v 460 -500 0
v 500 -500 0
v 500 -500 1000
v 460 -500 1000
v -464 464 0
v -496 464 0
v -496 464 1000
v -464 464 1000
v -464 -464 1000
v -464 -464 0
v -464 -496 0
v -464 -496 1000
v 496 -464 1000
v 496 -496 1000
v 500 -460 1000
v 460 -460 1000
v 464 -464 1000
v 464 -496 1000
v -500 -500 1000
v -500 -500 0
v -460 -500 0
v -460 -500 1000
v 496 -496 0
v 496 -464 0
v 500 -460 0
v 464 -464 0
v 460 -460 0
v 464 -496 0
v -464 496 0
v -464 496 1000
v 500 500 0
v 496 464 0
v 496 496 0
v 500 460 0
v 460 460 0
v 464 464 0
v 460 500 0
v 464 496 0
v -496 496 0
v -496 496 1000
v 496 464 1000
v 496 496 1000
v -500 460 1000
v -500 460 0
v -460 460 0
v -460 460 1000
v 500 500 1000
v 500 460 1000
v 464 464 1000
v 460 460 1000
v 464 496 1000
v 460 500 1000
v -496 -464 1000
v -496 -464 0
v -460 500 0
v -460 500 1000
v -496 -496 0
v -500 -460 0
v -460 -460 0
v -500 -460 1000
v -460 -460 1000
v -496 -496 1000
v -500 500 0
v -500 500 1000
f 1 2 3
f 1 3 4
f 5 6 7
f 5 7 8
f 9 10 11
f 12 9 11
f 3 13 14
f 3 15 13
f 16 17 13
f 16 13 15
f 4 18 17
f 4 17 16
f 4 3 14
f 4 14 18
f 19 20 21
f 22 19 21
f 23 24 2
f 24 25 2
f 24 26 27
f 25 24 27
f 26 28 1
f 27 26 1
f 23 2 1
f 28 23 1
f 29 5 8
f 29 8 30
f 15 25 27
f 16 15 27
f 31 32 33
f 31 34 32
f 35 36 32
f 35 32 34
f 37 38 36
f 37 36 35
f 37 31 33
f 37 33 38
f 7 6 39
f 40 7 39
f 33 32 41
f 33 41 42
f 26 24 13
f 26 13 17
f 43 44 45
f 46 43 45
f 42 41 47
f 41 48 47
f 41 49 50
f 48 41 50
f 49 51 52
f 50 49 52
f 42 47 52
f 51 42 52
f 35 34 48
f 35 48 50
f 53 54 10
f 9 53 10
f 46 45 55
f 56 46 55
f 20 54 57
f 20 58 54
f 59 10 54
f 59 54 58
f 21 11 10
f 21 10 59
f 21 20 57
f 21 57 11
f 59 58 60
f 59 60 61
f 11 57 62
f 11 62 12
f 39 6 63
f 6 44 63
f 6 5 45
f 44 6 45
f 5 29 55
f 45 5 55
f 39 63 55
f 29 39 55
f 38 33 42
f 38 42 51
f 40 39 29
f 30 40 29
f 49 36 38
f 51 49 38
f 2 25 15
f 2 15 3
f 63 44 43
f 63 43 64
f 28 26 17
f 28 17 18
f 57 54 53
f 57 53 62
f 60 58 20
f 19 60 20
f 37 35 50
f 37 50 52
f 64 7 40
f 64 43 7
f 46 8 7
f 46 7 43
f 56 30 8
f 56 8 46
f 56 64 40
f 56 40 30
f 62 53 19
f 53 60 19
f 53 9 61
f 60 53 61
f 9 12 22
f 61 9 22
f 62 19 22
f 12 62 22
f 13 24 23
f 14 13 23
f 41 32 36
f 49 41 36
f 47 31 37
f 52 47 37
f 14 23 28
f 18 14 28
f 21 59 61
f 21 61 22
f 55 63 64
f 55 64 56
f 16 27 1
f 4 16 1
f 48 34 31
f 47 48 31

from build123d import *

# Parameters (mm, degrees)
F0_W     = 40
F0_H     = 40
F1_DEPTH = 1000
F2_T     = -4


with BuildPart() as f1:
    # F0 (on Top) → F1 (new body)
    with BuildSketch(Plane.XY):
        with Locations((-480, 480)):
            Rectangle(F0_W, F0_H)
    extrude(amount=F1_DEPTH)

    # F2
    f2_openings = [f1.faces().sort_by_distance(p)[0] for p in [
        (-480, 480, 1000),
        (-480, 480, 0),
    ]]
    offset(amount=F2_T, openings=f2_openings)


with BuildPart() as f3_1:
    # F3: instance of F1
    add(f1.part.mirror(Plane.YZ))


with BuildPart() as f4_1:
    # F4: instance of F1
    add(f1.part.mirror(Plane.XZ))


with BuildPart() as f4_2:
    # F4: instance of F3_1
    add(f3_1.part.mirror(Plane.XZ))


solid = Compound([f1.part, f3_1.part, f4_1.part, f4_2.part])
